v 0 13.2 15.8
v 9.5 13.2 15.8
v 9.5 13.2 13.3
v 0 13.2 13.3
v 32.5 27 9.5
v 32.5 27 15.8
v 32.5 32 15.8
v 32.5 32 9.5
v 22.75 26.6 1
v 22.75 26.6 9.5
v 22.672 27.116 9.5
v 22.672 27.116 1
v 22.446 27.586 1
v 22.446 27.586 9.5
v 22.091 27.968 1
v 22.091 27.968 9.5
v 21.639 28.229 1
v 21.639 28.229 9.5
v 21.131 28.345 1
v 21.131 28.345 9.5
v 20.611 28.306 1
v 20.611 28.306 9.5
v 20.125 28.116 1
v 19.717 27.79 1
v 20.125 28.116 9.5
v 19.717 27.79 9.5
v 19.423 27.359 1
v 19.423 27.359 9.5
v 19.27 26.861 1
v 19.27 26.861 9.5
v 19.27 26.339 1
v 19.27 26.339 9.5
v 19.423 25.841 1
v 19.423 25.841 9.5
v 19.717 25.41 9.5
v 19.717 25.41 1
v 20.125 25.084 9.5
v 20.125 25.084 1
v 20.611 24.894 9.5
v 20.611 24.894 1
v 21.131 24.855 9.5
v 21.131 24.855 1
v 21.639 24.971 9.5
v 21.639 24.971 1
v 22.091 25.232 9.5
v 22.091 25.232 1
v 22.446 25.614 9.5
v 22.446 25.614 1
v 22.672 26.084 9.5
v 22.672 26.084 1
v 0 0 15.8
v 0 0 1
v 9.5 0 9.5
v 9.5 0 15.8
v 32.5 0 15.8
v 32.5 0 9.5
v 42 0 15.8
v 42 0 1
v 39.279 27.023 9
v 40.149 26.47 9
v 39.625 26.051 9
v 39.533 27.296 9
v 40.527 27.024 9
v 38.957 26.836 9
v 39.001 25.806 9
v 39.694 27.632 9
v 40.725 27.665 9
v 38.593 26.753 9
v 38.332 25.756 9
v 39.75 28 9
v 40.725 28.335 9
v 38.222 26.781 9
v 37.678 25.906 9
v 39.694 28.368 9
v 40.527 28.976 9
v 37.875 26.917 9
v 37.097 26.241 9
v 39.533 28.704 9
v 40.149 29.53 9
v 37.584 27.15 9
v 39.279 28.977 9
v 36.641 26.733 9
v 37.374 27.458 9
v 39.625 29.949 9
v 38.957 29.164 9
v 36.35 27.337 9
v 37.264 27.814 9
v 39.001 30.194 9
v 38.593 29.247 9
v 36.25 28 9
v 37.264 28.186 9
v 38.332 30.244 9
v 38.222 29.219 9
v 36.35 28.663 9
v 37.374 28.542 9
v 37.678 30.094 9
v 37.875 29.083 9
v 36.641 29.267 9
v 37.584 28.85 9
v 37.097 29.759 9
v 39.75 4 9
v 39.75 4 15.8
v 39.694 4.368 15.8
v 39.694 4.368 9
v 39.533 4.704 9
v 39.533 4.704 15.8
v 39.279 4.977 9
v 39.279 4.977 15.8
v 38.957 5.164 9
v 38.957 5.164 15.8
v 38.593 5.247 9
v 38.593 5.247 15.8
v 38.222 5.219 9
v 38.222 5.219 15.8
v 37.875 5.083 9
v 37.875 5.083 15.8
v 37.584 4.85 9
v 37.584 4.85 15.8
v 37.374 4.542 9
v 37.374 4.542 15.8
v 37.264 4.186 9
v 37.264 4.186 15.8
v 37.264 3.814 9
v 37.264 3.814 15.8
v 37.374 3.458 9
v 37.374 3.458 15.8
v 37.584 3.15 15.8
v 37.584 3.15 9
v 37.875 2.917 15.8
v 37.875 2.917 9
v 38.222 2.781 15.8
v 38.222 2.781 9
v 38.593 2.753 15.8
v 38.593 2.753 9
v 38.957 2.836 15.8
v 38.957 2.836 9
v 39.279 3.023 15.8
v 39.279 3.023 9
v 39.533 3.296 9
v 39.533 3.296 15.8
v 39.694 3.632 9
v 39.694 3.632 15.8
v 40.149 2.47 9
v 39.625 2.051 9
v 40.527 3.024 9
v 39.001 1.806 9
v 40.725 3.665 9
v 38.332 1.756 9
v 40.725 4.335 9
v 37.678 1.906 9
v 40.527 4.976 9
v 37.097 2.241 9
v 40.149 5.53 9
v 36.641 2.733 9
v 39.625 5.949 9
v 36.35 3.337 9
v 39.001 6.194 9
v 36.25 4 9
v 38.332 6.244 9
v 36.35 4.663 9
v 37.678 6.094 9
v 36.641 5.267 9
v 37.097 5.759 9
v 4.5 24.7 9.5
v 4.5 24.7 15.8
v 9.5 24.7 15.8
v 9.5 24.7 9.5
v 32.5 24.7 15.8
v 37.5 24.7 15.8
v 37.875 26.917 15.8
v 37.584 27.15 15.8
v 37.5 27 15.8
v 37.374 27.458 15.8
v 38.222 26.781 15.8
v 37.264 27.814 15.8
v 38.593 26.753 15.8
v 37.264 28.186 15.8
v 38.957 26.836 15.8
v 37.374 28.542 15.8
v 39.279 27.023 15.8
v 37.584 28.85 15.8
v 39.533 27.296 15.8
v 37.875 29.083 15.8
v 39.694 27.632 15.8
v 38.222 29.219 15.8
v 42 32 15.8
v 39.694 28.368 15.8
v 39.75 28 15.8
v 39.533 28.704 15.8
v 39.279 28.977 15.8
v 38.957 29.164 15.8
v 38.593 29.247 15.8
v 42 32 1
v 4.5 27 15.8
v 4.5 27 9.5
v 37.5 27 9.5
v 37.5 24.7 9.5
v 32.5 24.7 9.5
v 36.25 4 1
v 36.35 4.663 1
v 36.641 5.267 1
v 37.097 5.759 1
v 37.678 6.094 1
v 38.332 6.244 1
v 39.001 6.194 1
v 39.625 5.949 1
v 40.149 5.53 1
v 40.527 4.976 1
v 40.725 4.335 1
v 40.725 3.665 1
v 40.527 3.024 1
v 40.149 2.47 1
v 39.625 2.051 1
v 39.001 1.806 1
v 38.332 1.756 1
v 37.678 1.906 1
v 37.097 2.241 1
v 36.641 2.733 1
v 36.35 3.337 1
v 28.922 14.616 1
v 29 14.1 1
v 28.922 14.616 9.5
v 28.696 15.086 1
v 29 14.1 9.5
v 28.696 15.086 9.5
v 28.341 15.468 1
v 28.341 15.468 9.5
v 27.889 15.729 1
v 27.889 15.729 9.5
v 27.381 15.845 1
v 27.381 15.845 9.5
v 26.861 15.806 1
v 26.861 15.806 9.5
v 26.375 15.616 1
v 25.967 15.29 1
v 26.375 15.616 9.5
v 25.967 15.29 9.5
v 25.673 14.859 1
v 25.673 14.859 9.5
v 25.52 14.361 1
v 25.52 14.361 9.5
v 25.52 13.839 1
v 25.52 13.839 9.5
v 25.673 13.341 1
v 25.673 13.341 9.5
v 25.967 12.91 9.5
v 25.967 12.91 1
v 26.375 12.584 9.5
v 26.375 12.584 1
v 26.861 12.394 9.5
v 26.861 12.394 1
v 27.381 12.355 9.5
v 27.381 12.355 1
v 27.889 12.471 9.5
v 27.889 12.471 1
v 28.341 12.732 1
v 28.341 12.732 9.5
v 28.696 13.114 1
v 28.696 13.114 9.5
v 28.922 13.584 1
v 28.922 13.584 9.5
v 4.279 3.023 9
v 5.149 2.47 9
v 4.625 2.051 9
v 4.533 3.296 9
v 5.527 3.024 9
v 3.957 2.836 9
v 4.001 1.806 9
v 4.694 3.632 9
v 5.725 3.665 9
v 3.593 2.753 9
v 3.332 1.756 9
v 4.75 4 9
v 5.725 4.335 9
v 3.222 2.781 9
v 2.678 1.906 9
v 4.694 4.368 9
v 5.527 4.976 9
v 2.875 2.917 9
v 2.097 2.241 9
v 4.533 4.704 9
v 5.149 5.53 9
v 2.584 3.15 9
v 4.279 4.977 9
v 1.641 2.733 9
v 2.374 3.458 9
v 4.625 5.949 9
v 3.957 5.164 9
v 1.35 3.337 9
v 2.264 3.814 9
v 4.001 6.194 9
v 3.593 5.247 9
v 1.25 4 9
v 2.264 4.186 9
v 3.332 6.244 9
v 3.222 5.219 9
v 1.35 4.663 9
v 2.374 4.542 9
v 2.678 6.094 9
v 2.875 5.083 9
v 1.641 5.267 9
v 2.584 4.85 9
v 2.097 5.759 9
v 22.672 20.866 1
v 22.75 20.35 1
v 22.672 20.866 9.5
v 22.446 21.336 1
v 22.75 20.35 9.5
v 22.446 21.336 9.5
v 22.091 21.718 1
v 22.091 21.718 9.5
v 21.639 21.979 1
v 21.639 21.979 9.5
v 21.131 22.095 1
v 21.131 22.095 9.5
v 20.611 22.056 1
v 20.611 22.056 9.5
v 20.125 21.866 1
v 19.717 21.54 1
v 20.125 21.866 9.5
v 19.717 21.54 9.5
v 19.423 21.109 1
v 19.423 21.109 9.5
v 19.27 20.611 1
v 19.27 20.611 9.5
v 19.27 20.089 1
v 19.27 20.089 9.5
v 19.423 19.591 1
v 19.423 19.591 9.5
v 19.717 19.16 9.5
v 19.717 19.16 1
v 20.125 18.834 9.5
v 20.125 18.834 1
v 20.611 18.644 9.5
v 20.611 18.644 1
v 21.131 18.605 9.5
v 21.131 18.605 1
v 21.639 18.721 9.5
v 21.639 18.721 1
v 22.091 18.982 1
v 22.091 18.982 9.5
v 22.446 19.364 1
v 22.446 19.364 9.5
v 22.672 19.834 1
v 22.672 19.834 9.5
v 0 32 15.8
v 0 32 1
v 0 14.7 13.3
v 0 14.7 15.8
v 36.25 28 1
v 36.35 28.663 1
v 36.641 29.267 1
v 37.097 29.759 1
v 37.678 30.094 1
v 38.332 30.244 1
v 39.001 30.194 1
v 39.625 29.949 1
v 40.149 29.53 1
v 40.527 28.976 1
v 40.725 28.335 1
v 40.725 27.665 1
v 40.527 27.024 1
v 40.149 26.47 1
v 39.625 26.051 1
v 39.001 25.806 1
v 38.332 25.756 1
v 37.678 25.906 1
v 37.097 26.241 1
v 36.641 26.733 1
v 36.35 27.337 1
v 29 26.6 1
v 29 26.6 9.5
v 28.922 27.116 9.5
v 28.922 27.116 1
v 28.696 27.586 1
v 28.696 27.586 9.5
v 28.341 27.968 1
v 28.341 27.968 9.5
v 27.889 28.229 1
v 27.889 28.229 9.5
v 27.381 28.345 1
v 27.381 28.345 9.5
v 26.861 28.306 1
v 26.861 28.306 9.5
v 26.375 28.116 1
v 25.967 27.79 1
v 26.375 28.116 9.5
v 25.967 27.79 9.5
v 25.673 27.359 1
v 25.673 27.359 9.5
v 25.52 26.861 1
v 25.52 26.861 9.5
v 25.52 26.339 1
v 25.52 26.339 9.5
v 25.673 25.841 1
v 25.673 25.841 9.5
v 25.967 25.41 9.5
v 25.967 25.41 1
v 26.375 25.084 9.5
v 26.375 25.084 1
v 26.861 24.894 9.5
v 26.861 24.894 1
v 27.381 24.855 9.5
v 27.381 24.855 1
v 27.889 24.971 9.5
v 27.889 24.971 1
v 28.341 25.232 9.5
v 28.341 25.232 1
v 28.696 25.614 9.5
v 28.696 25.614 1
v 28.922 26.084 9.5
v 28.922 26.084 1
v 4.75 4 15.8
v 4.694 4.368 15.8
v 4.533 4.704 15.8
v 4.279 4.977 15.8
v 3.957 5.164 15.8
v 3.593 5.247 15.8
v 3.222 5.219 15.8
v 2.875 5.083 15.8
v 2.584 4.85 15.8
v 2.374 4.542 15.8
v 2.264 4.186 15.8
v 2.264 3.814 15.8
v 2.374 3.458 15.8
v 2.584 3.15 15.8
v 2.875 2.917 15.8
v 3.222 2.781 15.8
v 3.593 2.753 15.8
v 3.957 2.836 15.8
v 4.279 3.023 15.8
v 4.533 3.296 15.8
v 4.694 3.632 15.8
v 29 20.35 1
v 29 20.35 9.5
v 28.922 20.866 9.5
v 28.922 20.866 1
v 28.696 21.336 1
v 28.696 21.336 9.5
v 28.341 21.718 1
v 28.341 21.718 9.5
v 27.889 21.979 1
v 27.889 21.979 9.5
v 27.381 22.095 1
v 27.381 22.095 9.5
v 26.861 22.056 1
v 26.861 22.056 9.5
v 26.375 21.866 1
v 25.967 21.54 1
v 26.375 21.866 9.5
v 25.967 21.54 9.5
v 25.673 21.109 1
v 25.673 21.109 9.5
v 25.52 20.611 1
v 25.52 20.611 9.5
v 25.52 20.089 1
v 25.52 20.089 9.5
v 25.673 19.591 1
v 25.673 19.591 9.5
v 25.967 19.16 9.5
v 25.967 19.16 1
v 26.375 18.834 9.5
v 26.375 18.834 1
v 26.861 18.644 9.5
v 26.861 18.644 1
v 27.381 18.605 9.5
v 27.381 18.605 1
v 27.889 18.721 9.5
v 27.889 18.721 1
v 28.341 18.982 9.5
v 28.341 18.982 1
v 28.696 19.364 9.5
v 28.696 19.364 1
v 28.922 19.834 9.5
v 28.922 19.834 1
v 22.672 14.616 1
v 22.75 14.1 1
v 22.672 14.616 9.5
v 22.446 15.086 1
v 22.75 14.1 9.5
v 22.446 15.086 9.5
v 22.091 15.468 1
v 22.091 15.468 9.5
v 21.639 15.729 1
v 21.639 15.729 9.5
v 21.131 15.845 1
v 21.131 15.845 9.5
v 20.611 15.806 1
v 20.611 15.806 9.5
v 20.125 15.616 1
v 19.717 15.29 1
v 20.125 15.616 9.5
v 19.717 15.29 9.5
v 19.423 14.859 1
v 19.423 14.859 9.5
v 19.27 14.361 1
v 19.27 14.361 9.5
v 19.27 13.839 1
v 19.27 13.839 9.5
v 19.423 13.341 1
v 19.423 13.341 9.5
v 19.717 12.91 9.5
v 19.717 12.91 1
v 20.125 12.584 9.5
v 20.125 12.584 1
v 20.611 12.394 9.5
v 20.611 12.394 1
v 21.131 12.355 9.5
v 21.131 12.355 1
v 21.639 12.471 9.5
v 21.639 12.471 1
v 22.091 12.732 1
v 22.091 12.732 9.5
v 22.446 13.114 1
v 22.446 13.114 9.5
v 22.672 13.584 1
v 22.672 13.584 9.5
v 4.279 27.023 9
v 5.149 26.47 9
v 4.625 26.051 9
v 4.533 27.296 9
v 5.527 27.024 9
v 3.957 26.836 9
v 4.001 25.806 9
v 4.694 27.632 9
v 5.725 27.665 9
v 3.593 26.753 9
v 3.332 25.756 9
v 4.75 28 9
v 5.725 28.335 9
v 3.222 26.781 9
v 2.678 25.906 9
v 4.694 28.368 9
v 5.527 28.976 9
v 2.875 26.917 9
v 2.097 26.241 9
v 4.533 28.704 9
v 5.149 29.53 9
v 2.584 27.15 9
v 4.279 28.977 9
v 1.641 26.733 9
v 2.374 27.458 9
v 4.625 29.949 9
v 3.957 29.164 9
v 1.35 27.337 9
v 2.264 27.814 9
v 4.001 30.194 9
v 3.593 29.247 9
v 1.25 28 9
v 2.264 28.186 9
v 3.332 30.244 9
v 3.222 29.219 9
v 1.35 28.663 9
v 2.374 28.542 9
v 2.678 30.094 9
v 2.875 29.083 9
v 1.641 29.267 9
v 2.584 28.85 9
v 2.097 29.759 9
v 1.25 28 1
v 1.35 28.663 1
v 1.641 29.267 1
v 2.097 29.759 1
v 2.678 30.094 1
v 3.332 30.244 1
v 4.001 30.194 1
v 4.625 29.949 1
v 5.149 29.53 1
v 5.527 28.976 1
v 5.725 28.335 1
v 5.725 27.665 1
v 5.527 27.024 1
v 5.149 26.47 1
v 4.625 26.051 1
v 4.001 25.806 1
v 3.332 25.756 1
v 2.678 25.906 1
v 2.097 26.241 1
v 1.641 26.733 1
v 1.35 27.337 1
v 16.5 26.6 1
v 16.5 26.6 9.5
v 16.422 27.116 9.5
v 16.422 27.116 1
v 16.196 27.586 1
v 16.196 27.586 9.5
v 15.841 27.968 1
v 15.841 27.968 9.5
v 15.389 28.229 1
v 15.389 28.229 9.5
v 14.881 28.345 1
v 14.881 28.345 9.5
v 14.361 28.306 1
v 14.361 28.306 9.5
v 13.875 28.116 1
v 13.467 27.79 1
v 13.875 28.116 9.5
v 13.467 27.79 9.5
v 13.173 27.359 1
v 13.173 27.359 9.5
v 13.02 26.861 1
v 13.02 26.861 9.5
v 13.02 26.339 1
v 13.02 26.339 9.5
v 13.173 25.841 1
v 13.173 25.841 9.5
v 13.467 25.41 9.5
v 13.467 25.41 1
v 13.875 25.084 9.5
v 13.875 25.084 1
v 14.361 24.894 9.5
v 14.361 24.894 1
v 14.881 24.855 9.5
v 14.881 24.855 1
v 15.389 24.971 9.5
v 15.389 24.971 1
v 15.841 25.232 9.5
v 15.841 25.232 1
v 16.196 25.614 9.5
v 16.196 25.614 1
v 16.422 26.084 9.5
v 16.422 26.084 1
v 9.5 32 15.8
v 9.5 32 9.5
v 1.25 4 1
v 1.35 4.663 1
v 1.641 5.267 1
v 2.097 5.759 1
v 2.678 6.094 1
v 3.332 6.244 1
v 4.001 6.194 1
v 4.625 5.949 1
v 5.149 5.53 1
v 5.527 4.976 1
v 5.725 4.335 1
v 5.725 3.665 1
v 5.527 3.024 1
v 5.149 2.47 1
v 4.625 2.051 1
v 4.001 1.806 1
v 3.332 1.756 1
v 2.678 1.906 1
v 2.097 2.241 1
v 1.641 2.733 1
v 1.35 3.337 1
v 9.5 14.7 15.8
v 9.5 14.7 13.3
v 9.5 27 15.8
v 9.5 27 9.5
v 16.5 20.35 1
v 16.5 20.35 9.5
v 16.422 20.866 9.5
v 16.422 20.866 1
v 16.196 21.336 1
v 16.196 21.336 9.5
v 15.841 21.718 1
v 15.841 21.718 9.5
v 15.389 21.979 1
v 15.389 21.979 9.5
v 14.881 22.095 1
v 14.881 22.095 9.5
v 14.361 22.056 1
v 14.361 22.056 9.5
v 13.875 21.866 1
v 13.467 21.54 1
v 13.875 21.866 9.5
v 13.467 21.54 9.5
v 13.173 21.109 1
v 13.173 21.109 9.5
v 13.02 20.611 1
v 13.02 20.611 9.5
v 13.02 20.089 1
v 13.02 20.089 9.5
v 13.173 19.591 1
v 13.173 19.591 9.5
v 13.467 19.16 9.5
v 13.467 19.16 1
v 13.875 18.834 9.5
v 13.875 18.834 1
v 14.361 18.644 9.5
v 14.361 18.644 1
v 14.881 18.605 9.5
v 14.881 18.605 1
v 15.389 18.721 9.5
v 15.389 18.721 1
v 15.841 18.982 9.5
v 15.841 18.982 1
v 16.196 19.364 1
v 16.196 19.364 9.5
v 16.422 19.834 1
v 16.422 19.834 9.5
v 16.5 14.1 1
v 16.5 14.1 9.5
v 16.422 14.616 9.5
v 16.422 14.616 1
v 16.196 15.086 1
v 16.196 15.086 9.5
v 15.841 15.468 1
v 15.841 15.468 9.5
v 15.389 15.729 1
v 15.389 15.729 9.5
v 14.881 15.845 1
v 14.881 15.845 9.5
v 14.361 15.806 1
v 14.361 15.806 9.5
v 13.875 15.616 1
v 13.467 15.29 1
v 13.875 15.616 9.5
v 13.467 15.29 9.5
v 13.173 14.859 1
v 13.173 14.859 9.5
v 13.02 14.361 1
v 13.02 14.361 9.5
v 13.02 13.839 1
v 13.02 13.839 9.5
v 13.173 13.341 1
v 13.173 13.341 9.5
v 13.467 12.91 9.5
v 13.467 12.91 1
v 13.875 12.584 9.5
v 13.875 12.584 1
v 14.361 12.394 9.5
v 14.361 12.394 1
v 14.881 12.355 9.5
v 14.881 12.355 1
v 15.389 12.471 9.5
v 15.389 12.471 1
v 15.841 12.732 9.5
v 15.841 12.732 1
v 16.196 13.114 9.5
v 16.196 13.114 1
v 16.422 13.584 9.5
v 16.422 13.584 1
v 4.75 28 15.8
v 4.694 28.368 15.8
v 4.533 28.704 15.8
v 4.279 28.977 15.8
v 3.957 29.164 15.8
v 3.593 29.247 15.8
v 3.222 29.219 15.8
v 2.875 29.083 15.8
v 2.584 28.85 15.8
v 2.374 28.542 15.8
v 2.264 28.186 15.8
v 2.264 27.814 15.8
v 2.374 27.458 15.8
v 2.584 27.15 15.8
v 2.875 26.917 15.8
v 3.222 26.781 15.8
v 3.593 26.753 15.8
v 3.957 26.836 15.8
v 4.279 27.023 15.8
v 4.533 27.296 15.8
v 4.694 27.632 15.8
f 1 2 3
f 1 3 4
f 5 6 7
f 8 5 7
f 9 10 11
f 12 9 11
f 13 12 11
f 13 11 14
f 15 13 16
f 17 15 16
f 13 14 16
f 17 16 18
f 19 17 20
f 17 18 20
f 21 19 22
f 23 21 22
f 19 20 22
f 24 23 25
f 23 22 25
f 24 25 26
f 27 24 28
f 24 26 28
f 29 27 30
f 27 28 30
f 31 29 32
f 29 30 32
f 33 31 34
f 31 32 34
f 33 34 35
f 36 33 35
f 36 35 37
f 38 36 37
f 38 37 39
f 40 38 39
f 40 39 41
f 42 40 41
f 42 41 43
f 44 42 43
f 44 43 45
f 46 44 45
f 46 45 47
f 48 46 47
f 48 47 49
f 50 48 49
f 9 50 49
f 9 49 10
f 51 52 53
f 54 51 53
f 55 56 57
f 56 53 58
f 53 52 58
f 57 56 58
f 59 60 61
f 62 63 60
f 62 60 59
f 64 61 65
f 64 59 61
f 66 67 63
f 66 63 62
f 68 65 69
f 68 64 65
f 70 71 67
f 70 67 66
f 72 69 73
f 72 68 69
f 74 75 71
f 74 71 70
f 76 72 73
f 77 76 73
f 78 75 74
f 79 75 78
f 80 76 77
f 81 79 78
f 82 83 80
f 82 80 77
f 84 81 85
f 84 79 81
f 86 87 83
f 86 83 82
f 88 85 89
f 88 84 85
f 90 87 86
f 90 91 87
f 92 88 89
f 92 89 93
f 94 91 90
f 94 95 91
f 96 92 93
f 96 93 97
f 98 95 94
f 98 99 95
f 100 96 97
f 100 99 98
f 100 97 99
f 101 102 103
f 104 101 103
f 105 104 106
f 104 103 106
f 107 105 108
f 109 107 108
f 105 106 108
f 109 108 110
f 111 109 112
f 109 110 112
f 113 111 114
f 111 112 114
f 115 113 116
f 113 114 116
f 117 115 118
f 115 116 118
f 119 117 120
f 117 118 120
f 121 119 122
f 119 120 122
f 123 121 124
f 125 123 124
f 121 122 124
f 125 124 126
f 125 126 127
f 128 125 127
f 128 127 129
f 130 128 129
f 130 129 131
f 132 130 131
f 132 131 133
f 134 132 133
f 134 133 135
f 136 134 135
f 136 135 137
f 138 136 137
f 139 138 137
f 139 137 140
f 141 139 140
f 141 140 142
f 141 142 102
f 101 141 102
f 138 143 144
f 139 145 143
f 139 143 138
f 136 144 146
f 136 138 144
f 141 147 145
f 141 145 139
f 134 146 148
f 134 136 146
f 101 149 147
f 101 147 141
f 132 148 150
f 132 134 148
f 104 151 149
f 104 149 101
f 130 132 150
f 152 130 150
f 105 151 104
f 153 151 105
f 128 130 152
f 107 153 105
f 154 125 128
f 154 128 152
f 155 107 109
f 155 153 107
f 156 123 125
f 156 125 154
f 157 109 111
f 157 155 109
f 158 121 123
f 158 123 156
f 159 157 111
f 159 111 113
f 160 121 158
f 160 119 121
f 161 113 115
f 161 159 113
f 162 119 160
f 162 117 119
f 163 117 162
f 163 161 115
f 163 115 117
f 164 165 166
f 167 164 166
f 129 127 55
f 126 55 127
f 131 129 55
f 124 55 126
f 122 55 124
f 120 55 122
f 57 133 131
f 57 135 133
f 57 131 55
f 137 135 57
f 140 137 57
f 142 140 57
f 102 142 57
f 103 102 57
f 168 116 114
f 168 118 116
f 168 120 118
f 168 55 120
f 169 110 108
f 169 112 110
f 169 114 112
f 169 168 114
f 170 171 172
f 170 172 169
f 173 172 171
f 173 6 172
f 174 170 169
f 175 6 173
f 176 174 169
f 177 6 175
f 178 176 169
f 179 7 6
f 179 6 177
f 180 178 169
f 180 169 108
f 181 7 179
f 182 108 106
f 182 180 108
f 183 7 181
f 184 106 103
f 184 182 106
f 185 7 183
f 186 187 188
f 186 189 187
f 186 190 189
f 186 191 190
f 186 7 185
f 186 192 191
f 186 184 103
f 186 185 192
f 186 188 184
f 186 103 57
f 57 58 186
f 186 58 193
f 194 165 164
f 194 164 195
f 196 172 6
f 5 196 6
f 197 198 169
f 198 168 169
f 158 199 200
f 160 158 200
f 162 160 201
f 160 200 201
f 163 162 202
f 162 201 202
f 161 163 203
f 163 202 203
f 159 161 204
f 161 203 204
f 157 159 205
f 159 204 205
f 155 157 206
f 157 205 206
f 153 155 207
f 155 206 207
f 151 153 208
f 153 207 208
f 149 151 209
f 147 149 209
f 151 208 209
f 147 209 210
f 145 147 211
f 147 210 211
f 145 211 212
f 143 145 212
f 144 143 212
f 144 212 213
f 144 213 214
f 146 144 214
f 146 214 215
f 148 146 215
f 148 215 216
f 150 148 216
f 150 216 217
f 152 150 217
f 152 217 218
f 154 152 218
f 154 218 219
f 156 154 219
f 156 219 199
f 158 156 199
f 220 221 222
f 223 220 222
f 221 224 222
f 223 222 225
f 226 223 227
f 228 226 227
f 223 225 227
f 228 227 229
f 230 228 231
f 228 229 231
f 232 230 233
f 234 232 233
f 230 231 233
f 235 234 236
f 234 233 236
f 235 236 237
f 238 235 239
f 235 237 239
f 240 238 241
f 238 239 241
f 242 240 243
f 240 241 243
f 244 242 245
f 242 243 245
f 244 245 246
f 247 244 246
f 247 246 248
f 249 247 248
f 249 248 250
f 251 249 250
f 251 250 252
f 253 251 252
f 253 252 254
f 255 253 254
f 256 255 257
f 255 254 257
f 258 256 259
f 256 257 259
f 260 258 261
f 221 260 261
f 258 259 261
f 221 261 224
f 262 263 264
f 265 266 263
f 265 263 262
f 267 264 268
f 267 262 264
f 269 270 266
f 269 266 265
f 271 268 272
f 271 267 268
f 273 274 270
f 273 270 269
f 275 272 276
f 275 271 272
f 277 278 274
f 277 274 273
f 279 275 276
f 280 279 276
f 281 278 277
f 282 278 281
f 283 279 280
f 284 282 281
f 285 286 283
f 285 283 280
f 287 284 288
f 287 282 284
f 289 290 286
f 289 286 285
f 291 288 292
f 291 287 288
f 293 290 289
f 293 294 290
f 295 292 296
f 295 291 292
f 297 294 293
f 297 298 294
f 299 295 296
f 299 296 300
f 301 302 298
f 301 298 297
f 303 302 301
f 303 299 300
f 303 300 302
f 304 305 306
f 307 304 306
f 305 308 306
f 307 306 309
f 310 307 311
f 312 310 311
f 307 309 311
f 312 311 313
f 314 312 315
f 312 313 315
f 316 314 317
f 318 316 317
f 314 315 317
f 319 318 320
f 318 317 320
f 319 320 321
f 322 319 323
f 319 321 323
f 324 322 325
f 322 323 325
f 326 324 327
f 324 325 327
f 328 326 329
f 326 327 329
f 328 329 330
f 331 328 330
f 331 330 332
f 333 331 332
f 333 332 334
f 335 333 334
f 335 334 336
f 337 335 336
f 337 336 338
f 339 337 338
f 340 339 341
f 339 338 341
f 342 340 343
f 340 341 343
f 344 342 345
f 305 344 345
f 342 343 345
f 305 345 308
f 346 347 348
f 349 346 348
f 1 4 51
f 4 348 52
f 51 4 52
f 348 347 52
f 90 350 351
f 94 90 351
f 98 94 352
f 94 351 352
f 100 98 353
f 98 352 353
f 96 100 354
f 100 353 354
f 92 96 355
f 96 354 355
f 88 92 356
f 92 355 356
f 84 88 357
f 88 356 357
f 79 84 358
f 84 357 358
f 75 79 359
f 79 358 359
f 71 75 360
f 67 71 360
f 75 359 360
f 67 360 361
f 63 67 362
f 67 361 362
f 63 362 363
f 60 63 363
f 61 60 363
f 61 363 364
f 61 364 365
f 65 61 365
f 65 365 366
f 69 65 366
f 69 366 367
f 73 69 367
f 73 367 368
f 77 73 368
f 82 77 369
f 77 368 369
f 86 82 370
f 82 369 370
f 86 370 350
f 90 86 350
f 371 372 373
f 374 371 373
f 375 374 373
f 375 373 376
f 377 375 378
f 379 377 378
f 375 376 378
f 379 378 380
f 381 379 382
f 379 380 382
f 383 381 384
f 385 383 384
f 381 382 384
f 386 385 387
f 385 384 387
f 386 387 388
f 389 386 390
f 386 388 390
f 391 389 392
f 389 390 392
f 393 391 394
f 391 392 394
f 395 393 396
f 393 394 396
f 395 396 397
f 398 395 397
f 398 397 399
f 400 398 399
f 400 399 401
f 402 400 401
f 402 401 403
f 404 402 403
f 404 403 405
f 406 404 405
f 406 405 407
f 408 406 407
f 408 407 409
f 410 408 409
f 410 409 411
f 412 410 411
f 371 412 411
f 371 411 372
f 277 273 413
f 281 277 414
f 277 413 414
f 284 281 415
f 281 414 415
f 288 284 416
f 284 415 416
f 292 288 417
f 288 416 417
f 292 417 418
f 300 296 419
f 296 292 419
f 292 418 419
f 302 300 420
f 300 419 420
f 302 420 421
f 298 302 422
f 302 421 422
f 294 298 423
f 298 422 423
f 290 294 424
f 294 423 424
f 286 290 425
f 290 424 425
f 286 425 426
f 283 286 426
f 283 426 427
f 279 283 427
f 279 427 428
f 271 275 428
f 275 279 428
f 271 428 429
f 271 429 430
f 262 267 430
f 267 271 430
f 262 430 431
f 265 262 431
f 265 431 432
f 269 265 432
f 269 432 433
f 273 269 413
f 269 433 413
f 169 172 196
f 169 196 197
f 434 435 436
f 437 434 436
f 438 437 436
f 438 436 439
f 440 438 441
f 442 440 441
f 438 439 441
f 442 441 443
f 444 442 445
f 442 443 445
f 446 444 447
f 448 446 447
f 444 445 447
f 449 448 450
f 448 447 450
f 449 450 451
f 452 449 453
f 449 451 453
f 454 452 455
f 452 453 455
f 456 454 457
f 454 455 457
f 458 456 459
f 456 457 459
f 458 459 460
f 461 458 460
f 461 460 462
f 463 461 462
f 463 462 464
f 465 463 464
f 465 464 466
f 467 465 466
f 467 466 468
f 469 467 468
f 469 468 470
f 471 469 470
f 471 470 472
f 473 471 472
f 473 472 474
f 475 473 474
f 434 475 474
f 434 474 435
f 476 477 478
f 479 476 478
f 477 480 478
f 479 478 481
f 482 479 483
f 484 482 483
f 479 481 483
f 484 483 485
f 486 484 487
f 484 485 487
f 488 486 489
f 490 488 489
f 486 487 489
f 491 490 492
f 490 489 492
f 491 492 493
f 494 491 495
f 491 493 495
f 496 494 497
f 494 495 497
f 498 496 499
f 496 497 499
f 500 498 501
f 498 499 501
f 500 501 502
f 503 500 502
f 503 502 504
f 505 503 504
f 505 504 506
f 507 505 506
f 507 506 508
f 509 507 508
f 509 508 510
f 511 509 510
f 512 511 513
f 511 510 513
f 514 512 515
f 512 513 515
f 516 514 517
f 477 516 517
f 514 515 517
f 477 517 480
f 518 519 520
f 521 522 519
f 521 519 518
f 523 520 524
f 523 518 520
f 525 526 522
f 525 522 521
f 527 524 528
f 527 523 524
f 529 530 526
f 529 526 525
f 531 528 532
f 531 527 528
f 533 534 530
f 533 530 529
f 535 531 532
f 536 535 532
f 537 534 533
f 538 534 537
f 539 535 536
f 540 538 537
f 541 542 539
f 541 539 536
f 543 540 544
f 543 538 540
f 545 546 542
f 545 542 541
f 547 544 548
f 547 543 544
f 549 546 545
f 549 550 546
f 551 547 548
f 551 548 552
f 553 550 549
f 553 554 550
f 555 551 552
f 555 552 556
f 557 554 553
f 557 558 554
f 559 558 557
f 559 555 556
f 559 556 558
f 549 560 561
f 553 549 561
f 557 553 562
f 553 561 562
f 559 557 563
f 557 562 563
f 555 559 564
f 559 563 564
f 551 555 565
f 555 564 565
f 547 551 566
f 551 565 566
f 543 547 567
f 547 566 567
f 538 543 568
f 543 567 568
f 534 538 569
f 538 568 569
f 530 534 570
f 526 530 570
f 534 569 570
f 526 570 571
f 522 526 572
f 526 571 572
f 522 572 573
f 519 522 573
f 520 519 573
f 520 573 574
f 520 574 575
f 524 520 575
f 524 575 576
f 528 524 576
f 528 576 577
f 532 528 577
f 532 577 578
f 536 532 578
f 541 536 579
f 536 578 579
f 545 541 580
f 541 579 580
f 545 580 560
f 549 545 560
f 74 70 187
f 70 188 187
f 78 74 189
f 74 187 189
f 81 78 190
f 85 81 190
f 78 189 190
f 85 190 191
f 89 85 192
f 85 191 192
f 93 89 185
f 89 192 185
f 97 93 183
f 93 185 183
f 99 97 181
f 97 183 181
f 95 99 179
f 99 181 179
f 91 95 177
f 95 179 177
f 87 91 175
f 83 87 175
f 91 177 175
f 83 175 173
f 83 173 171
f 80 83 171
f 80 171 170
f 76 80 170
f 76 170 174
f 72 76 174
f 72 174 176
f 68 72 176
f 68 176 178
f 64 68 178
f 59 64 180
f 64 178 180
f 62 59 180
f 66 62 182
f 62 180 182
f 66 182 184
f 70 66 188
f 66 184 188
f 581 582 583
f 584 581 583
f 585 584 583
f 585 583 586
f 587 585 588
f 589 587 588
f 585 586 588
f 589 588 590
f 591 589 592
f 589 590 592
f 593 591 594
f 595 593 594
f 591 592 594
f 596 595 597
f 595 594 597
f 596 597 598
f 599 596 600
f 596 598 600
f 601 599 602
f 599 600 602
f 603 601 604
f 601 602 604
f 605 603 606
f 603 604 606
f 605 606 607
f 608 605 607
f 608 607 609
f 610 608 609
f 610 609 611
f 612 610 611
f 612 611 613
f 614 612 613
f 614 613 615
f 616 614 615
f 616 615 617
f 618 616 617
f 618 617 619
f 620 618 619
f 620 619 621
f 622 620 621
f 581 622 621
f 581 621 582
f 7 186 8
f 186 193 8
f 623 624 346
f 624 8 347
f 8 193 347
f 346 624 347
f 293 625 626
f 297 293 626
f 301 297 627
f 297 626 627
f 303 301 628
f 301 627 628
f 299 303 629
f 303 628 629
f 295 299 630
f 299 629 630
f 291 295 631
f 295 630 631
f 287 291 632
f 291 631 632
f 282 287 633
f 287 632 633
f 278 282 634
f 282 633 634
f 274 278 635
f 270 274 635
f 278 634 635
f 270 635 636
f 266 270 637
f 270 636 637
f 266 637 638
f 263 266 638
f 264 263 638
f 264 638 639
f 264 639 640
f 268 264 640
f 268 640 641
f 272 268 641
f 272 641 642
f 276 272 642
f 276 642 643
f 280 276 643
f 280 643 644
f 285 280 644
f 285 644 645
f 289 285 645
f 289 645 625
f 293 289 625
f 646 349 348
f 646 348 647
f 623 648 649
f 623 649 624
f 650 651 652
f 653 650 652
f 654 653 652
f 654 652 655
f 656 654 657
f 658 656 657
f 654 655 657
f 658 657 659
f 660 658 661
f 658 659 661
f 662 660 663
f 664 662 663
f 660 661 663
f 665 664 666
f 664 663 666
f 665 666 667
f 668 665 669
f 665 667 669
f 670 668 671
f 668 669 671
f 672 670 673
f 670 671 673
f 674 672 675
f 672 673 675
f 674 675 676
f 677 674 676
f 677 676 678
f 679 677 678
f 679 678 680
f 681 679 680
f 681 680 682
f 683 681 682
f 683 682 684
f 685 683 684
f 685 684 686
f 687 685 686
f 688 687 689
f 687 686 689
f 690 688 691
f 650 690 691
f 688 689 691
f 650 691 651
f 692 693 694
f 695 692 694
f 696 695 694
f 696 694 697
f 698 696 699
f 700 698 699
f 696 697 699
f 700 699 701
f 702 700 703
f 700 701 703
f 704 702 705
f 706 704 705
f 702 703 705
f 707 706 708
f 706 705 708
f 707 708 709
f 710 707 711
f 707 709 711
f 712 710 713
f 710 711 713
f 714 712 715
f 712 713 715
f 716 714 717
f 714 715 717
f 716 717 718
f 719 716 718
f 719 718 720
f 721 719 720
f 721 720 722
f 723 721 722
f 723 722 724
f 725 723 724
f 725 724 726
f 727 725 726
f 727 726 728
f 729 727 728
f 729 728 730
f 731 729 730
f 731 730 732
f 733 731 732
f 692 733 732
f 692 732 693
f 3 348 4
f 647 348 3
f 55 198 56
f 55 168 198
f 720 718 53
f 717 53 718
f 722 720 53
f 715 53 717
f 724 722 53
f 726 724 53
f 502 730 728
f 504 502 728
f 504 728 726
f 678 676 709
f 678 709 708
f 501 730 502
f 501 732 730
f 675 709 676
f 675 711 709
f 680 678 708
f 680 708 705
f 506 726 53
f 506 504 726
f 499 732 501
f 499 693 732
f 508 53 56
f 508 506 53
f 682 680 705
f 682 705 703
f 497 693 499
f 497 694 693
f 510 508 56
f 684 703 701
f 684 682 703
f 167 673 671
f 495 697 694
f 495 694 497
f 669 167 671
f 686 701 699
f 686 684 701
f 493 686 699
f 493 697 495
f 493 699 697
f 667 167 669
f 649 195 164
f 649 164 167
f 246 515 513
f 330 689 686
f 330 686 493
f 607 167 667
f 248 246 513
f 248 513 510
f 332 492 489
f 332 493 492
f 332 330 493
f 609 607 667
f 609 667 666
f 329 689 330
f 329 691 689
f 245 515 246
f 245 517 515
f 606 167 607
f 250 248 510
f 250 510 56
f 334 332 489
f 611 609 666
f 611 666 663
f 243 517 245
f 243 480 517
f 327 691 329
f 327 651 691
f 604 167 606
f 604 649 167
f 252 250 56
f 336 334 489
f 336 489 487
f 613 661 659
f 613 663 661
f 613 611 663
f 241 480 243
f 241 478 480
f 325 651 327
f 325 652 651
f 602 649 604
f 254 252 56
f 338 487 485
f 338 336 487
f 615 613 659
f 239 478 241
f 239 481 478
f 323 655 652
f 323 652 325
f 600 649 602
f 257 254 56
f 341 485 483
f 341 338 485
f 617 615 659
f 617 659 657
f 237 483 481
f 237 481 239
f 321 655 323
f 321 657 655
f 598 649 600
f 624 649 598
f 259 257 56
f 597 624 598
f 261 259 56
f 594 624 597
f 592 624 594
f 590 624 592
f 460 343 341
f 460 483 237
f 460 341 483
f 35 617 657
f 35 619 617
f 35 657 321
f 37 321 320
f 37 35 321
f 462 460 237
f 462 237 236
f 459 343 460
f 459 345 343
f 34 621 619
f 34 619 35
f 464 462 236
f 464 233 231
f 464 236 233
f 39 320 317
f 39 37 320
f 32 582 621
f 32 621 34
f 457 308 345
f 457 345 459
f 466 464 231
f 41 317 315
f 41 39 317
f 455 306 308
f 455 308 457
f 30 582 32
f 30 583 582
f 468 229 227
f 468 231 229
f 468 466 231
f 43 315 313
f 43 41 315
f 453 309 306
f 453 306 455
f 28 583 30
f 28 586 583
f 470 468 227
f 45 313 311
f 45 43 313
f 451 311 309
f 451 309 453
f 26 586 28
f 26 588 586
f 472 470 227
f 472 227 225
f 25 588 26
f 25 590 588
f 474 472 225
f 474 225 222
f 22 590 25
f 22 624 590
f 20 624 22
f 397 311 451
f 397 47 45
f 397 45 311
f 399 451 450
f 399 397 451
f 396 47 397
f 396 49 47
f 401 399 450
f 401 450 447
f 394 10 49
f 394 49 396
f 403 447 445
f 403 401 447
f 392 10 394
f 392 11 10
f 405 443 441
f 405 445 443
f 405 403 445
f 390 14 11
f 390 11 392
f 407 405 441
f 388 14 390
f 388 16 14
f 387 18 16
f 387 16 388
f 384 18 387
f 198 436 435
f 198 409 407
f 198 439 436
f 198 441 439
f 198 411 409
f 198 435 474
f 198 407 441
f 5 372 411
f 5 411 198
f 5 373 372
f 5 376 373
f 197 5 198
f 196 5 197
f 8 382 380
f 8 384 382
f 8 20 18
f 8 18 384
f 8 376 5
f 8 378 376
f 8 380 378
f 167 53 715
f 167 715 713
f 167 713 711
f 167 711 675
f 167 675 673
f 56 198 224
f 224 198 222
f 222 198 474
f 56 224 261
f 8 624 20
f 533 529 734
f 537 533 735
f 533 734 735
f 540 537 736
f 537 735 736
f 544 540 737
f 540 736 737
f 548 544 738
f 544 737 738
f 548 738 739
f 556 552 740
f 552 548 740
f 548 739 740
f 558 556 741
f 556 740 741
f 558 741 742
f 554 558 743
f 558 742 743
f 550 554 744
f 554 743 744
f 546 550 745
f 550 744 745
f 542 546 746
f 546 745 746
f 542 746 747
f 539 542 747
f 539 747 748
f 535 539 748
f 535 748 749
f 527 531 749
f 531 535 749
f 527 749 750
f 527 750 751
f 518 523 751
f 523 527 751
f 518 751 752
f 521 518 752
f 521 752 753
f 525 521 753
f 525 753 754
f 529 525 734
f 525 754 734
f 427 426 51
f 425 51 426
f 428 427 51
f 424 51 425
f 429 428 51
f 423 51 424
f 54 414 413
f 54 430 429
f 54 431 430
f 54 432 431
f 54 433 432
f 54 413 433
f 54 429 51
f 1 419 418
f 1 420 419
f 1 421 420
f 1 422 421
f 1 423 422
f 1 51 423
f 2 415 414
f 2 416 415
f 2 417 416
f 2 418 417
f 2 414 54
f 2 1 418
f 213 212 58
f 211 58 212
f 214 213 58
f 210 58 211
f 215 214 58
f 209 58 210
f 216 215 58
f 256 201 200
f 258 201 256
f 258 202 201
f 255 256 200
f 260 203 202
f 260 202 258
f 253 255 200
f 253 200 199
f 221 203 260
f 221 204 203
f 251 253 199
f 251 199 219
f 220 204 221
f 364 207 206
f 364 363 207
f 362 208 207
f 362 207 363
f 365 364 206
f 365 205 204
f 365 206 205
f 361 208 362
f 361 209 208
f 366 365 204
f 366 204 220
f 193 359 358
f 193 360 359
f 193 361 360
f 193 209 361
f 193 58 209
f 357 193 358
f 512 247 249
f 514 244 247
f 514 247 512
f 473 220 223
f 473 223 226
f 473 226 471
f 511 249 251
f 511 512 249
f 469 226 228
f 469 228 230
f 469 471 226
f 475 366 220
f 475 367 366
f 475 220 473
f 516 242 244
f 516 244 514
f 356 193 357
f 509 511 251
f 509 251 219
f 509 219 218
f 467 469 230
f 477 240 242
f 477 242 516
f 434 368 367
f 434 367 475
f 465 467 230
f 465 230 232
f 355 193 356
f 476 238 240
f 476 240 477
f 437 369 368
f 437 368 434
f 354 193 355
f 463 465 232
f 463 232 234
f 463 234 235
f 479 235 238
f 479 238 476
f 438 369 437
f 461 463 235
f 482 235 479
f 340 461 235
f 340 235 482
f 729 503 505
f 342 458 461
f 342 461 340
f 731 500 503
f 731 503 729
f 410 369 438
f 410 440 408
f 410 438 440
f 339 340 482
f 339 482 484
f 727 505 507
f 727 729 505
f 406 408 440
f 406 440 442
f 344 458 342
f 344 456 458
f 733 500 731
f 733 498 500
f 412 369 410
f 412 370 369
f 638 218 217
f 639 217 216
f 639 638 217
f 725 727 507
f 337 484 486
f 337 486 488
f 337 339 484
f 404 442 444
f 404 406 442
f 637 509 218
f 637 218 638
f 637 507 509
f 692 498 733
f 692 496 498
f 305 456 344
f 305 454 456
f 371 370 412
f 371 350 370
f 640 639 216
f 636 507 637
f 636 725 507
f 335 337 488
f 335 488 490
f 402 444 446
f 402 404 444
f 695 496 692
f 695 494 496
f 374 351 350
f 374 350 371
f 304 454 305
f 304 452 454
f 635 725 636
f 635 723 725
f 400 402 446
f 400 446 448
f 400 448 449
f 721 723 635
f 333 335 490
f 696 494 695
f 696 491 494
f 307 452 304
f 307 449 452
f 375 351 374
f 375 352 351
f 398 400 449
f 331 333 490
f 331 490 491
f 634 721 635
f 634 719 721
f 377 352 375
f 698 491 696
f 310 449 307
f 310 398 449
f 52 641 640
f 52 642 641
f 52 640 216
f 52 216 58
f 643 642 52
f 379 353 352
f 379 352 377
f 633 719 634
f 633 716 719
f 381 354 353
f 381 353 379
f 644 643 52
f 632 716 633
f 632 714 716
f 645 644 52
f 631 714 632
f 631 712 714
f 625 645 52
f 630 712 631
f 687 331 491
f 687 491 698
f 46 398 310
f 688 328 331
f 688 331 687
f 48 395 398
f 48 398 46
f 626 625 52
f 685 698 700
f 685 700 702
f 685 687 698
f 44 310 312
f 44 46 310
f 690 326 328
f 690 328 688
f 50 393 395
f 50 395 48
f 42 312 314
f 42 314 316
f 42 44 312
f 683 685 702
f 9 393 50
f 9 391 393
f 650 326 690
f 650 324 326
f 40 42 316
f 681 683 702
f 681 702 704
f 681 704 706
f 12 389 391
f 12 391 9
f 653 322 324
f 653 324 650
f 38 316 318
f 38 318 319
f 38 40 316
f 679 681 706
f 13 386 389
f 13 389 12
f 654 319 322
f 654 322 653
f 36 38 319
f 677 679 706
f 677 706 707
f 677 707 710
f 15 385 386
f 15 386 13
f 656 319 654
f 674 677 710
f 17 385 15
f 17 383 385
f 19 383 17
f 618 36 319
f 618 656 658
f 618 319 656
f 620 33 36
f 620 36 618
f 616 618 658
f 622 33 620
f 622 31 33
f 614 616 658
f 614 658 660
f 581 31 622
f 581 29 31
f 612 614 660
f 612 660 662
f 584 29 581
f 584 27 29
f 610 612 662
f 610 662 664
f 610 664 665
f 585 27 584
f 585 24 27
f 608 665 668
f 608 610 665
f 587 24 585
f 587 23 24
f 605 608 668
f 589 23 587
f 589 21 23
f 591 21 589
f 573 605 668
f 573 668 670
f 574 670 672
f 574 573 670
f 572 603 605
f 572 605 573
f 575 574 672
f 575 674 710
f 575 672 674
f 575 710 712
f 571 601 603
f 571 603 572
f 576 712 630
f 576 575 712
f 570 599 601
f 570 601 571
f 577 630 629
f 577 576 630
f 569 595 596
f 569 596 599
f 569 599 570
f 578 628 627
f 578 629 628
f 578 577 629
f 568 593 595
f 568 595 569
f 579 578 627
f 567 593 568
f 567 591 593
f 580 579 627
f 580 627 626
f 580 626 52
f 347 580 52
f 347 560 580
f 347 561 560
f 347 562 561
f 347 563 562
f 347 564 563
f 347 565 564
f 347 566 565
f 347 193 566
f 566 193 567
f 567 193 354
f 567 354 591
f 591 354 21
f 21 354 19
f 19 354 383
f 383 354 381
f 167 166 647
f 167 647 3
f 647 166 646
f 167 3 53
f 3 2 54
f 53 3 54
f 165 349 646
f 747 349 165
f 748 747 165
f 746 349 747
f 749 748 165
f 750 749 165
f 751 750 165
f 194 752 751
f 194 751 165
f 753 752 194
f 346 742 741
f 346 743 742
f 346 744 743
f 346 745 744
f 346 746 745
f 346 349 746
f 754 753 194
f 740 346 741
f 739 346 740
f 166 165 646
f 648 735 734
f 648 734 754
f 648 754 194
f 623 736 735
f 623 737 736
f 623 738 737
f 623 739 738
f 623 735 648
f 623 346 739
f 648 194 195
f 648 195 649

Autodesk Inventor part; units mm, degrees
ref_plane "YZ Plane" through (0, 0, 0) normal (1, 0, 0) x (0, 1, 0)
ref_plane "XZ Plane" through (0, 0, 0) normal (0, 1, 0) x (-1, 0, 0)
ref_plane "XY Plane" through (0, 0, 0) normal (0, 0, 1) x (1, 0, 0)
sketch "Sketch2" plane through (0, 0, 0) normal (0, 0, 1) x (1, 0, 0)
  line L0 (0, 0) -> (42, 0)
  line L1 (42, 0) -> (42, 32)
  line L2 (42, 32) -> (0, 32)
  line L3 (0, 32) -> (0, 0)
  dimension "d0" = 42
  dimension "d1" = 32
extrude "Cover_Body" add sketch "Sketch2" along normal blind 15.8
sketch "Sketch4" plane through (0, 0, 15.8) normal (0, 0, 1) x (1, 0, 0)
  line L0 (42, 32) -> (0, 32) projected
  line L1 (0, 32) -> (0, 0) projected
  line L2 (4.5, 24.7) -> (9.5, 24.7)
  line L3 (32.5, 24.7) -> (37.5, 24.7)
  line L4 (42, 0) -> (42, 32) projected
  line L5 (0, 0) -> (42, 0) projected
  line L6 (4.5, 24.7) -> (4.5, 27)
  line L7 (4.5, 27) -> (9.5, 27)
  line L8 (9.5, 27) -> (9.5, 32)
  line L9 (37.5, 27) -> (37.5, 24.7)
  line L10 (37.5, 27) -> (32.5, 27)
  line L11 (32.5, 27) -> (32.5, 32)
  line L12 (9.5, 32) -> (32.5, 32)
  line L13 (21, 36.5125) -> (21, -47.625) construction
  line L14 (32.5, 24.7) -> (32.5, 0)
  line L15 (9.5, 24.7) -> (9.5, 0)
  line L16 (9.5, 0) -> (32.5, 0)
  point P0 (4.9935, 32)
  point P1 (37, 32)
  dimension "d6" = 5
  dimension "d14" = 2.3
  dimension "d15" = 2.3
  dimension "d22" = 42
  dimension "d23" = 21
  dimension "d24" = 23
  dimension "d28" = 5
  dimension "d118" = 23
  dimension "d119" = 11.5
  dimension "d120" = 11.5
  dimension "d121" = 24.7
extrude "Servo_Opening" cut sketch "Sketch4" against normal blind 6.3 contours L11 L10 L9 L3 L14 L5 L15 L2 L6 L7 L8 L0
sketch "Sketch5" plane through (0, 0, 15.8) normal (0, 0, 1) x (1, 0, 0)
  line L0 (0, 32) -> (0, 0) projected
  line L1 (0, 13.2) -> (0, 14.7)
  line L2 (-29.647, 13.95) -> (54.8226, 13.95) construction
  line L3 (0, 0) -> (42, 0) projected
  line L4 (0, 14.7) -> (9.5, 14.7)
  line L5 (9.5, 14.7) -> (9.5, 13.2)
  line L6 (9.5, 13.2) -> (0, 13.2)
  line L7 (9.5, 0) -> (9.5, 24.7) projected
  line L8 (9.5, 32) -> (0, 32) projected
  dimension "d97" = 1.5
  dimension "d131" = 13.2
extrude "Cable_Opening" cut sketch "Sketch5" against normal blind 2.5 contours L4 L5 L6 L0
sketch "Sketch6" plane through (0, 0, 15.8) normal (0, 0, 1) x (1, 0, 0)
  circle A0 centre (3.5, 28) radius 1.25
  circle A1 centre (38.5, 28) radius 1.25
  circle A2 centre (38.5, 4) radius 1.25
  circle A3 centre (3.5, 4) radius 1.25
  line L0 (21, 34.35) -> (21, -13.275) construction
  line L1 (-20.6375, 16) -> (66.675, 16) construction
  line L2 (42, 0) -> (42, 32) projected
  line L3 (0, 32) -> (0, 0) projected
  line L4 (9.5, 32) -> (0, 32) projected
  line L5 (0, 0) -> (42, 0) projected
  point P0 (42, 12.35)
  point P1 (0, 12.35)
  dimension "d29" = 2.5
  dimension "d30" = 2.5
  dimension "d31" = 2.5
  dimension "d32" = 2.5
  dimension "d33" = 42
  dimension "d34" = 21
  dimension "d35" = 32
  dimension "d36" = 16
  dimension "d37" = 35
  dimension "d38" = 17.5
  dimension "d39" = 24
  dimension "d40" = 12
extrude "Cover_Mounting_Holes" cut sketch "Sketch6" against normal up to surface (15.8 mm away)
sketch "Sketch16" plane through (0, 0, 0) normal (0, 0, -1) x (-1, 0, 0)
  circle A0 centre (-3.5, 4) radius 2.25
  circle A1 centre (-3.5, 4) radius 1.25 projected
  circle A2 centre (-38.5, 4) radius 2.25
  circle A3 centre (-3.5, 28) radius 2.25
  circle A4 centre (-38.5, 28) radius 2.25
  circle A5 centre (-38.5, 4) radius 1.25 projected
  circle A6 centre (-38.5, 28) radius 1.25 projected
  circle A7 centre (-3.5, 28) radius 1.25 projected
  point P0 (0, 0)
  dimension "d98" = 4.5
  dimension "d99" = 4.5
  dimension "d100" = 4.5
  dimension "d101" = 4.5
extrude "Slot_Mounting_ScrewsHead" cut sketch "Sketch16" against normal blind 9
sketch "Sketch17" plane through (0, 0, 9.5) normal (0, 0, 1) x (1, 0, 0)
  circle A0 centre (14.75, 26.6) radius 1.75
  line L0 (9.5, 32) -> (32.5, 32) projected
  line L1 (9.5, 27) -> (9.5, 32) projected
  point P0 (0, 0)
  dimension "d105" = 3.5
  dimension "d106" = 5.4
  dimension "d107" = 5.25
extrude "Heat_Dissipation_Hole" cut sketch "Sketch17" against normal up to surface (9.5 mm away)
pattern_linear "Pattern_Heat_Dissipation_Hole" count 3 spacing 6.25 along (1, 0, 0) count 3 spacing 6.25 along (0, -1, 0) of "Heat_Dissipation_Hole"
sketch "Sketch20" plane through (0, 0, 0) normal (0, 0, -1) x (-1, 0, 0)
  line L0 (-42, 0) -> (-42, 32) projected
  line L1 (0, 0) -> (-42, 0)
  line L2 (-42, 0) -> (-42, 32)
  line L3 (-42, 32) -> (0, 32)
  line L4 (0, 32) -> (0, 0)
extrude "Material reduction for PLA printing only" cut sketch "Sketch20" against normal blind 1
equation "\"d15\" = d14"
equation "\"d23\" = 0.5 * d22"
equation "\"d28\" = d6"
equation "\"d120\" = 0.5 * d118"
equation "\"d34\" = 0.5 * d33"
equation "\"d36\" = 0.5 * d35"
equation "\"d38\" = 0.5 * d37"
equation "\"d40\" = 0.5 * d39"
equation "\"d98\" = d99"
equation "\"d99\" = d101"
equation "\"d100\" = d101"
properties part number "Module_Cover"
